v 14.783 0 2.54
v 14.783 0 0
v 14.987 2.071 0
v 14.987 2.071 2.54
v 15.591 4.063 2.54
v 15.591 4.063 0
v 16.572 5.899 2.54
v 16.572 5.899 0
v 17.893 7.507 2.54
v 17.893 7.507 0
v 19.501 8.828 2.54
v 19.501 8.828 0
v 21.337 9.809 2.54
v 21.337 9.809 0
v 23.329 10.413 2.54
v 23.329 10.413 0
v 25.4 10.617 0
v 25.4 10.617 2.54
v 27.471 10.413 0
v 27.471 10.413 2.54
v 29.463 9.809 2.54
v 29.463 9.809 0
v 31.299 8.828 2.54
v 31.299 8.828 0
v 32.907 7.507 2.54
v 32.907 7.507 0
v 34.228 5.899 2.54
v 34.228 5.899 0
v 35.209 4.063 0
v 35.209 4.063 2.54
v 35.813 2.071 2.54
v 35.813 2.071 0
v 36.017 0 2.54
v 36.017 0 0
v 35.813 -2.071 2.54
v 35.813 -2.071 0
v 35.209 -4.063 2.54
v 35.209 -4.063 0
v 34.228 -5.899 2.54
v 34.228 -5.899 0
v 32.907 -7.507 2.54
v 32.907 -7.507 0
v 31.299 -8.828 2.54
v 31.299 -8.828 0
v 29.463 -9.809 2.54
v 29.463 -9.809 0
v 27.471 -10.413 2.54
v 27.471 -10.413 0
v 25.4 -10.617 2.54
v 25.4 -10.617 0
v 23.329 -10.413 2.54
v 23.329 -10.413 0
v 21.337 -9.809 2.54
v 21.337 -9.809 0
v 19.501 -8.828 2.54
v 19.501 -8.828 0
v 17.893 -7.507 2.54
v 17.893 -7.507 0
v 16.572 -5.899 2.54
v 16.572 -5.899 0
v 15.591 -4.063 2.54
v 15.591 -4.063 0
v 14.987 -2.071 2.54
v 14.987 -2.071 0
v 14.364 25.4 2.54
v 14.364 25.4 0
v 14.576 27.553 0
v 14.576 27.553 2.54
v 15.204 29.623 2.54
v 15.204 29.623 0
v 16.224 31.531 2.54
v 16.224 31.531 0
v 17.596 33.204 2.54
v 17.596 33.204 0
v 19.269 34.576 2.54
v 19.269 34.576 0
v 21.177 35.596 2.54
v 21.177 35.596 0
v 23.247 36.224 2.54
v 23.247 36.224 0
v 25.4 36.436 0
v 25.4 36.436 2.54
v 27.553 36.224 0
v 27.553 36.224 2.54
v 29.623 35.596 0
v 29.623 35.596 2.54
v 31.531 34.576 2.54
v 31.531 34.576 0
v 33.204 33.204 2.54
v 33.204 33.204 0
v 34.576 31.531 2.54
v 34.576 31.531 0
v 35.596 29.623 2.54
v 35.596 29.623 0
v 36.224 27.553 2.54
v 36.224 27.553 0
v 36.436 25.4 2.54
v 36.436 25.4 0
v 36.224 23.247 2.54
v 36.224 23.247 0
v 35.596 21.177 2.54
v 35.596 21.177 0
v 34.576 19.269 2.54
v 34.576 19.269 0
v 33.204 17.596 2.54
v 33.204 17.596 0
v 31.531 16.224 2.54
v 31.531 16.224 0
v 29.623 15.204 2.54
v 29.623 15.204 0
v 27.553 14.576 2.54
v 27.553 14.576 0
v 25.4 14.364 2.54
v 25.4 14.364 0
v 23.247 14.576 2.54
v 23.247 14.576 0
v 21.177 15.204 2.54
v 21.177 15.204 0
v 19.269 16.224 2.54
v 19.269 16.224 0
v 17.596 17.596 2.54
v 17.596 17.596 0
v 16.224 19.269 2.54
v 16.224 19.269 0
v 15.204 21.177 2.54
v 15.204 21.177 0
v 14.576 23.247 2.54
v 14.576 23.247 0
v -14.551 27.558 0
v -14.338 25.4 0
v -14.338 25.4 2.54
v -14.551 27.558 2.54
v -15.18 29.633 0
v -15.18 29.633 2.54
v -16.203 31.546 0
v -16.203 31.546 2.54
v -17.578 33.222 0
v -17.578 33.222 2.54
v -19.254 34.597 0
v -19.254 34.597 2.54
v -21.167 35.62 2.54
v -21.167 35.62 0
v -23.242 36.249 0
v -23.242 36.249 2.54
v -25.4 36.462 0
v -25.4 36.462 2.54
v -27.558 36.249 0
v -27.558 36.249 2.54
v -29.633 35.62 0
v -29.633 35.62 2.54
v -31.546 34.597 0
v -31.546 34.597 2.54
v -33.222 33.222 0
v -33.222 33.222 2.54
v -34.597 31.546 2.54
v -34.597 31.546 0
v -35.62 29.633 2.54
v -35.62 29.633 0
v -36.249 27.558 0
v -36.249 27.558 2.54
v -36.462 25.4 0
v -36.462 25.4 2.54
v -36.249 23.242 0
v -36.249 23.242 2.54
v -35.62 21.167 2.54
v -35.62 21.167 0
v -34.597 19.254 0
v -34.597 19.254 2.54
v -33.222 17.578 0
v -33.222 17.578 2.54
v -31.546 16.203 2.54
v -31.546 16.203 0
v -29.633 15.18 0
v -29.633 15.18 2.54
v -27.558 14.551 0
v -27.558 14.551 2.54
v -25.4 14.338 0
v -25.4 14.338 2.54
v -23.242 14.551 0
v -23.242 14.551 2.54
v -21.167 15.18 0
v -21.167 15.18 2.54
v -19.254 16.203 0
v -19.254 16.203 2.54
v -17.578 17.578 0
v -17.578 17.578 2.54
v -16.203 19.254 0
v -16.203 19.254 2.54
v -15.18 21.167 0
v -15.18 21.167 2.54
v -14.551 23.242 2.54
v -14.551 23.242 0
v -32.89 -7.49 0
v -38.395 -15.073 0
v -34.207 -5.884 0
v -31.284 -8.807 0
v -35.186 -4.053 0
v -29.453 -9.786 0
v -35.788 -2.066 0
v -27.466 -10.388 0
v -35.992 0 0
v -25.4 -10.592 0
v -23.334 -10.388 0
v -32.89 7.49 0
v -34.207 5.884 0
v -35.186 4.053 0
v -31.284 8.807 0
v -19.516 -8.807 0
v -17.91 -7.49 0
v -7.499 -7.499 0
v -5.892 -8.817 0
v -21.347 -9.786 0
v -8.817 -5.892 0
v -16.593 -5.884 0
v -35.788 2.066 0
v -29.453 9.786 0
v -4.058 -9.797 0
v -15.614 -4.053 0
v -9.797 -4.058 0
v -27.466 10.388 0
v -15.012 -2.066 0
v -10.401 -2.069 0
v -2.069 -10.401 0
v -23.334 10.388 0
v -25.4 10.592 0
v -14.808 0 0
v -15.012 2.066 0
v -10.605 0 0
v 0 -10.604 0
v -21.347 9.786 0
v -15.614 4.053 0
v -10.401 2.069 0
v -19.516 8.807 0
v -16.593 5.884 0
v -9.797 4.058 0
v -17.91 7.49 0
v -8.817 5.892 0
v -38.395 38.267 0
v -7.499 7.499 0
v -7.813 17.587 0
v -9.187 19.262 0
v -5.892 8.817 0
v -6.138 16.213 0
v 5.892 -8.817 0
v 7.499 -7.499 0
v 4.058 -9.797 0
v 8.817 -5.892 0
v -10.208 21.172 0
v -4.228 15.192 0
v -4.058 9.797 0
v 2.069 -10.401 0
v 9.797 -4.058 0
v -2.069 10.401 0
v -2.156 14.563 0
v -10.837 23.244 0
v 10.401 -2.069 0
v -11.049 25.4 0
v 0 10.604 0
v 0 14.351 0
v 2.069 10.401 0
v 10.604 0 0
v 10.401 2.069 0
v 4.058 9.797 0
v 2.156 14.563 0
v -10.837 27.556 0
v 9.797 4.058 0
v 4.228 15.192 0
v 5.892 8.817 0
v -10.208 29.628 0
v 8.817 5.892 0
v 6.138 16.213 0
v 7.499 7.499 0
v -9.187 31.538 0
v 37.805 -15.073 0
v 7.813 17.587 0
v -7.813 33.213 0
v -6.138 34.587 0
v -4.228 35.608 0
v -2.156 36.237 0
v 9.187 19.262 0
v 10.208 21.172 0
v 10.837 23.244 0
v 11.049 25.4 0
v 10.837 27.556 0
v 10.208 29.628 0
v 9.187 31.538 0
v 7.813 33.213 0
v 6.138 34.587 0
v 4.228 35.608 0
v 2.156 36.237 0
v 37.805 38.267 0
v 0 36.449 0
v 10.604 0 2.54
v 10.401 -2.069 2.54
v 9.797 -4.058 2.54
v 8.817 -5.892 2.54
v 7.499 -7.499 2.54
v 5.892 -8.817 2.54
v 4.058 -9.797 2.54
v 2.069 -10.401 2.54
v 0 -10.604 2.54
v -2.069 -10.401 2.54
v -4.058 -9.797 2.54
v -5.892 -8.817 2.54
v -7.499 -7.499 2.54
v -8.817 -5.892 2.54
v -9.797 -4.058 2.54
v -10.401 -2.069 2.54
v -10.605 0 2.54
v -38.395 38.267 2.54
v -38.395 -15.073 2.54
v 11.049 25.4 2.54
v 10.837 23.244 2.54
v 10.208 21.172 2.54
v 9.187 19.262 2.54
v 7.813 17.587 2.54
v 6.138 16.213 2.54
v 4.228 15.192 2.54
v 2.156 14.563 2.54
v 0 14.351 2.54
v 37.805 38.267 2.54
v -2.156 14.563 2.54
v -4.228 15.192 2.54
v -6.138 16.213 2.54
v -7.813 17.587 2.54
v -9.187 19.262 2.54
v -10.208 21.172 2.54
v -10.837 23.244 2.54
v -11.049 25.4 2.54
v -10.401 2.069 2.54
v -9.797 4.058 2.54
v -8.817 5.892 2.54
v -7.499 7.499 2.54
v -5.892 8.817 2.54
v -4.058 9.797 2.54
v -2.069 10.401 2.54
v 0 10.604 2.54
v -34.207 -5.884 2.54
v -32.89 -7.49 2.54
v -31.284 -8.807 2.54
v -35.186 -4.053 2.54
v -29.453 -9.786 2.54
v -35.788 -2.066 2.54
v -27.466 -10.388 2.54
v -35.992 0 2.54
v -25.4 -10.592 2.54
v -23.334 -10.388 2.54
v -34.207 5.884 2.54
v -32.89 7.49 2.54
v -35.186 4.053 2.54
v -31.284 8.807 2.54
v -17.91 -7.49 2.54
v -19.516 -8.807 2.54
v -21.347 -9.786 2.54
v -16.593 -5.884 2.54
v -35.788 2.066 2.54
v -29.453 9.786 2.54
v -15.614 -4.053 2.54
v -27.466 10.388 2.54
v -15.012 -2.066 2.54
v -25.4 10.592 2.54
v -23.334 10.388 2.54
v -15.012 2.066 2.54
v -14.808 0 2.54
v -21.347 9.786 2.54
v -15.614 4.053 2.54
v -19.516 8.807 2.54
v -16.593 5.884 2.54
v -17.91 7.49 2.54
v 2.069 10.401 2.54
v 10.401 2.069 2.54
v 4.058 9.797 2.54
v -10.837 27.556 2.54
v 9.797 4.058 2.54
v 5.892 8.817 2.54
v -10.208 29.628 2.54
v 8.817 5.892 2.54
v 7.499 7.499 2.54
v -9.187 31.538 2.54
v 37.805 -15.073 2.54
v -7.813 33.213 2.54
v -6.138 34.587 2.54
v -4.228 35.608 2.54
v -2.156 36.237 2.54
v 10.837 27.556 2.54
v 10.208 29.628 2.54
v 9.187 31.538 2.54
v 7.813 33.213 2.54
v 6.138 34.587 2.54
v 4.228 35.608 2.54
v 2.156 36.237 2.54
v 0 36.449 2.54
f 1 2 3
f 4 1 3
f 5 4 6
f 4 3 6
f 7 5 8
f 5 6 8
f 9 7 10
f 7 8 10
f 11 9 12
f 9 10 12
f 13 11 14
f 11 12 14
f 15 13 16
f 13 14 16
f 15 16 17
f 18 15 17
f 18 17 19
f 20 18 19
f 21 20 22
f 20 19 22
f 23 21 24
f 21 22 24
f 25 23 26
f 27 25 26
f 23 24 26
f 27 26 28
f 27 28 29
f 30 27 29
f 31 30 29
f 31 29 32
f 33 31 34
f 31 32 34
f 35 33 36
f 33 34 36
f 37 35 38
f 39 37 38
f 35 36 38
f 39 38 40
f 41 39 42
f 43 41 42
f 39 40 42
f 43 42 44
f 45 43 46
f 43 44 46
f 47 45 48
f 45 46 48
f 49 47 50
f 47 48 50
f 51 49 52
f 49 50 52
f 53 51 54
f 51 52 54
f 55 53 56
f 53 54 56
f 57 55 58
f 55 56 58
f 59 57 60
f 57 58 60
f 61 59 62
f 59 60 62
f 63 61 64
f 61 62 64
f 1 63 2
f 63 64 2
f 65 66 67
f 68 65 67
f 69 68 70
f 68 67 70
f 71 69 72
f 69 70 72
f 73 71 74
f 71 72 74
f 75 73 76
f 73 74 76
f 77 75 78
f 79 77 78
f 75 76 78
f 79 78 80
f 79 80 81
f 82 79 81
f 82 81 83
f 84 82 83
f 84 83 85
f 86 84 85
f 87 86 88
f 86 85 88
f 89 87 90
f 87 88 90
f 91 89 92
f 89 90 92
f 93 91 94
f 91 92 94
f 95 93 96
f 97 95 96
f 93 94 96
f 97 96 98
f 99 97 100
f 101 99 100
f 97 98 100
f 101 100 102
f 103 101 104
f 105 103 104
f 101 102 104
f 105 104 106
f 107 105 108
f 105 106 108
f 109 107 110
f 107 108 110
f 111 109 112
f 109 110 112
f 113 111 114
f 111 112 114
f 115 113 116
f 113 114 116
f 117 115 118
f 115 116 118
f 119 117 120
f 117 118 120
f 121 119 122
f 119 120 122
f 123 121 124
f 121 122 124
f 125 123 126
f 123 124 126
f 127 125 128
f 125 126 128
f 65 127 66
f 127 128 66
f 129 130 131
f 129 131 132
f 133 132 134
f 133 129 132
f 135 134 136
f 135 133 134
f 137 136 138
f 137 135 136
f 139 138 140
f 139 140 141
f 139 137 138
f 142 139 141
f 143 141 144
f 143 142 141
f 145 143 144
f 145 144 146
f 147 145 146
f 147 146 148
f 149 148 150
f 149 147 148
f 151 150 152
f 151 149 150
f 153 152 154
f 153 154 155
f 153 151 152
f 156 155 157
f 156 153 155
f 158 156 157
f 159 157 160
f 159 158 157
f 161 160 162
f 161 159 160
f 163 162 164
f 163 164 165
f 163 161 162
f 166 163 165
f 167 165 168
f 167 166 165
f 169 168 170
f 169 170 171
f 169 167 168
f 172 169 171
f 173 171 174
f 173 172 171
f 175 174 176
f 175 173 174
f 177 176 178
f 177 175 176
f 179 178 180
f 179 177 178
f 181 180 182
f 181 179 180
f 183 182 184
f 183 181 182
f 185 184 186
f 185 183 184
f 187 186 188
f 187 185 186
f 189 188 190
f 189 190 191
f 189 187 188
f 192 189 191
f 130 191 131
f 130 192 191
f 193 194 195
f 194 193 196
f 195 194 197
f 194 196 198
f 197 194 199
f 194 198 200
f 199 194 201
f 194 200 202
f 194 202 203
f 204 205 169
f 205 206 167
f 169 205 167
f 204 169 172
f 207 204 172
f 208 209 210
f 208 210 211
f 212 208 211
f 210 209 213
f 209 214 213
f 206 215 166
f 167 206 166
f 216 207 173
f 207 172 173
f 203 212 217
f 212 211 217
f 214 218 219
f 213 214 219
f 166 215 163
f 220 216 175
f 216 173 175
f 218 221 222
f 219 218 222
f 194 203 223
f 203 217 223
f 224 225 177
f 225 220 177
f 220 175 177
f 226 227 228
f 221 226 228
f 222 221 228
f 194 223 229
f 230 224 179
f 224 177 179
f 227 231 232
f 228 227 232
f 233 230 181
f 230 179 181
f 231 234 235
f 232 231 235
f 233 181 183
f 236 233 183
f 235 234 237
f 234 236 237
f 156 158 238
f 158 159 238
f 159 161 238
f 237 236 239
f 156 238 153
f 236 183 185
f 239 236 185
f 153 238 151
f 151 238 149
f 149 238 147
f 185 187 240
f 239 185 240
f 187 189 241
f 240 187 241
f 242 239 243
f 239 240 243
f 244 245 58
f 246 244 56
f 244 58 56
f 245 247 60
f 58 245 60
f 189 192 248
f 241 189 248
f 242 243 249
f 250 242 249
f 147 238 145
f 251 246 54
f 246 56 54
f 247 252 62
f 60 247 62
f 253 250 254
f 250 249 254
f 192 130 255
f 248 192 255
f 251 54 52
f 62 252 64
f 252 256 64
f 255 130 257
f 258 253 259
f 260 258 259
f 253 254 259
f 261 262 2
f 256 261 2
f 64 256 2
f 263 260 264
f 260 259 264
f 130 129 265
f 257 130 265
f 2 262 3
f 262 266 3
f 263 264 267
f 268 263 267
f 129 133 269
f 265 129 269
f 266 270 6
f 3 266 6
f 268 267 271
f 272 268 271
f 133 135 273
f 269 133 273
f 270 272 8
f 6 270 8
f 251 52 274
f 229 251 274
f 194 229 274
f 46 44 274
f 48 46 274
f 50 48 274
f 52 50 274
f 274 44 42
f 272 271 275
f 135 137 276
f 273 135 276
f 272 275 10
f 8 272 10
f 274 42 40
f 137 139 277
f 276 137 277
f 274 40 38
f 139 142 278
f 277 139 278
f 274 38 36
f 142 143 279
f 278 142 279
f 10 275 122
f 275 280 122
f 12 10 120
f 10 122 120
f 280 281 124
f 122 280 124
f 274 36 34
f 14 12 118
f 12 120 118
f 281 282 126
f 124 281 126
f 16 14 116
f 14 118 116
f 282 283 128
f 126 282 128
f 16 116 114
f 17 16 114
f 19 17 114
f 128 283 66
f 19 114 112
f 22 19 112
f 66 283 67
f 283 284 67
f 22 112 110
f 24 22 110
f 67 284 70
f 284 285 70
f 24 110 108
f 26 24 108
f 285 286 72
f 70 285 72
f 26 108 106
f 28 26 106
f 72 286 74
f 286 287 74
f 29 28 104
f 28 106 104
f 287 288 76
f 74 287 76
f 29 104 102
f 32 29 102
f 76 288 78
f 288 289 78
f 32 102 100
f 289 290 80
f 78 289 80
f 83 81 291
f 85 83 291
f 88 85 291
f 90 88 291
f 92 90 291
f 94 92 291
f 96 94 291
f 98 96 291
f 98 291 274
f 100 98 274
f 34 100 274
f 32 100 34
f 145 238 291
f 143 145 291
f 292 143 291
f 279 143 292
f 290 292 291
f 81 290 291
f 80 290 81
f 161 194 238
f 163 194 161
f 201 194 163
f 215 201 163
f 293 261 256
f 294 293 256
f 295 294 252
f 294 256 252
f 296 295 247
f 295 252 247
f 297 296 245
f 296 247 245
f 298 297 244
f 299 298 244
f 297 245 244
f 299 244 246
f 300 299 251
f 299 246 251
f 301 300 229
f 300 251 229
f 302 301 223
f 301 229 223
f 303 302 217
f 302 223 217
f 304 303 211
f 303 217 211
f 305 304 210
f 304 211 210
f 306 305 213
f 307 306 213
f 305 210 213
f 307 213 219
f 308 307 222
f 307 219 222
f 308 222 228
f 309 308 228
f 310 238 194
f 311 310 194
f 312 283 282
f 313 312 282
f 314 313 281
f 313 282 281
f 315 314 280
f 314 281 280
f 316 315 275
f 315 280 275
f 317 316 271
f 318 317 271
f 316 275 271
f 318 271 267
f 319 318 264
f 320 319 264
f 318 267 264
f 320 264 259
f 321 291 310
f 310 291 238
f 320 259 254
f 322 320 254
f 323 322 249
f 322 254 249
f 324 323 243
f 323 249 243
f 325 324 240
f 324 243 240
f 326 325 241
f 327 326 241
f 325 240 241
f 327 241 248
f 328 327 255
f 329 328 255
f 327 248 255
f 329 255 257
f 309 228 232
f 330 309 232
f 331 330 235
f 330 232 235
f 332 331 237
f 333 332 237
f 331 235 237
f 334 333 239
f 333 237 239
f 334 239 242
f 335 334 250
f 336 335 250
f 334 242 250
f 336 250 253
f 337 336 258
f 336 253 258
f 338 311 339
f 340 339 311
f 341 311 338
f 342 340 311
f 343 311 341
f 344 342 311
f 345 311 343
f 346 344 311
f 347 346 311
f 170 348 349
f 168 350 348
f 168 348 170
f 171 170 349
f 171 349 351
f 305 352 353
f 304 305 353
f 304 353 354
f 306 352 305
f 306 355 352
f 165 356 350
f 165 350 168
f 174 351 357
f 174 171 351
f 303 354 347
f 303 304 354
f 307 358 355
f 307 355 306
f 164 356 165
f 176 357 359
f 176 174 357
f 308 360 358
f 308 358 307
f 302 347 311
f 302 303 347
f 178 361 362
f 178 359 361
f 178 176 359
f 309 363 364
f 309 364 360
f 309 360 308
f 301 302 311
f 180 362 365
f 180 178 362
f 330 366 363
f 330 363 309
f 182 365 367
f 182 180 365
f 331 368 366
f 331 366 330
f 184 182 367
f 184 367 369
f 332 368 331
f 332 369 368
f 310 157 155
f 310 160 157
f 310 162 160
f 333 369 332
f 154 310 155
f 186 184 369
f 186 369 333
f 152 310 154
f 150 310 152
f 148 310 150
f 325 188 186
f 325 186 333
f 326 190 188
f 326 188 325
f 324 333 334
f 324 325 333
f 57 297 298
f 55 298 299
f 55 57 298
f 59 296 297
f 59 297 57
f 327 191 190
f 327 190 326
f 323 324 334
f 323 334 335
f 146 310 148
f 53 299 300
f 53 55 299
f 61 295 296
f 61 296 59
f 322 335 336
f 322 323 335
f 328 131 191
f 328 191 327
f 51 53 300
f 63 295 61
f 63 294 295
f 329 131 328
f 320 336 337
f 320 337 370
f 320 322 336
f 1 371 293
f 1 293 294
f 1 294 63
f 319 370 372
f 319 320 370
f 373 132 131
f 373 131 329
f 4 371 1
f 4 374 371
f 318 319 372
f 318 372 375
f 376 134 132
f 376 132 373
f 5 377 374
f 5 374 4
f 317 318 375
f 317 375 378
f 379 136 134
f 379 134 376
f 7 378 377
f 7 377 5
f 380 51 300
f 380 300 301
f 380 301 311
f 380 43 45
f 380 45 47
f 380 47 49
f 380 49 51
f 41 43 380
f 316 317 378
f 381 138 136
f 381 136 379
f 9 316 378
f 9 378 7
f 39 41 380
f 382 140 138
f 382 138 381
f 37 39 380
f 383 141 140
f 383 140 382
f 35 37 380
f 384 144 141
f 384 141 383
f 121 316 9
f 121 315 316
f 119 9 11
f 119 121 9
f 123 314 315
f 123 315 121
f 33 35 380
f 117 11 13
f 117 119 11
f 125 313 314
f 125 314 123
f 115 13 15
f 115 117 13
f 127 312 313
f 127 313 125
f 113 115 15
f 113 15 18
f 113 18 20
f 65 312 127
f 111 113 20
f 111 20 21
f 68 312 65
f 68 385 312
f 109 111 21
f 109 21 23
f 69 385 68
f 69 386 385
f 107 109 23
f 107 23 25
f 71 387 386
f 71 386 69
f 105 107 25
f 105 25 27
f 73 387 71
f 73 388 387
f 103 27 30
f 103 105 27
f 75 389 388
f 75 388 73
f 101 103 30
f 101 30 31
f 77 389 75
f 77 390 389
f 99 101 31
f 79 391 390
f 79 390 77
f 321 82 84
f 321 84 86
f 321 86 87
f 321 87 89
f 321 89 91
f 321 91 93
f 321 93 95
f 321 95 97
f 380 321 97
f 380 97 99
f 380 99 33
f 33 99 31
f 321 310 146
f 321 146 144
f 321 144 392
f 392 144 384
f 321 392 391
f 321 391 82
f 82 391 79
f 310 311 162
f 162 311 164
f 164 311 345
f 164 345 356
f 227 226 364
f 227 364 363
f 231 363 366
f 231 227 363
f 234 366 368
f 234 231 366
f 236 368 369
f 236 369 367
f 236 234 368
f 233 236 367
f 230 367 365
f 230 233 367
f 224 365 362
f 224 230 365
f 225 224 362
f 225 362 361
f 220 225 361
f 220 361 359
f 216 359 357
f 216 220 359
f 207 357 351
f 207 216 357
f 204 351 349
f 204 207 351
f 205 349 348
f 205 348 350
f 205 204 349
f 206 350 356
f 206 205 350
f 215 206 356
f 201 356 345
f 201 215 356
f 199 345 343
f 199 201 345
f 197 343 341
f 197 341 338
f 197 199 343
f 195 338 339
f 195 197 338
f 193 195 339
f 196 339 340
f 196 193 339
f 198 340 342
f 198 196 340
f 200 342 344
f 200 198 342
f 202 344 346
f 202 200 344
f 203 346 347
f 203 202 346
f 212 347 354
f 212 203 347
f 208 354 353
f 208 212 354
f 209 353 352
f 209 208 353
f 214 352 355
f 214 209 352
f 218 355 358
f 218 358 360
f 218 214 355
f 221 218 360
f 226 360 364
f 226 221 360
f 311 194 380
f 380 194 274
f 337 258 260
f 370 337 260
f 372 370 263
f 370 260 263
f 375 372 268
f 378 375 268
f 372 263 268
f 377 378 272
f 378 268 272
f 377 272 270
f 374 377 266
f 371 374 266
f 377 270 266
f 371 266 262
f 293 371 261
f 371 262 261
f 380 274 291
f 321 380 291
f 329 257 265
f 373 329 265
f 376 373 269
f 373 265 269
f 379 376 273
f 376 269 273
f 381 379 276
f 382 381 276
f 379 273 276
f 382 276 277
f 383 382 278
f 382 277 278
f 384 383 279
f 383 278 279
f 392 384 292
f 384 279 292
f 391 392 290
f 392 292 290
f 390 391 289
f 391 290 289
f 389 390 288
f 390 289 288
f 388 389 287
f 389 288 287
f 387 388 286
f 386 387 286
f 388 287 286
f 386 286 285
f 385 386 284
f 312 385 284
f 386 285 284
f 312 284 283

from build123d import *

# Parameters (mm, degrees)
F0_R     = 10.5918
F0_R_2   = 11.0617
F1_DEPTH = 2.54


with BuildPart() as f1:
    # F0 (on Top) → F1 (new body)
    with BuildSketch(Plane.XY):
        Polygon((37.805012, 12.867026), (0, 12.867026), (-38.394988, 12.867026), (-38.394988, -15.072974), (37.805012, -15.072974), align=None)
        with Locations((-25.4, 0)):
            Circle(F0_R, mode=Mode.SUBTRACT)
        with BuildLine():
            ThreePointArc((0, 10.6045), (7.498514, 7.498514), (10.6045, 0))
            ThreePointArc((10.6045, 0), (0, -10.6045), (-10.6045, 0))
            ThreePointArc((-10.6045, 0), (-7.498514, 7.498514), (0, 10.6045))
        make_face(mode=Mode.SUBTRACT)
        with BuildLine():
            ThreePointArc((36.0172, 0), (25.4, -10.6172), (14.7828, 0))
            ThreePointArc((14.7828, 0), (25.4, 10.6172), (36.0172, 0))
        make_face(mode=Mode.SUBTRACT)
        Polygon((-38.394988, 12.867026), (0, 12.867026), (37.805012, 12.867026), (37.805012, 38.267026), (-38.394988, 38.267026), align=None)
        with Locations((-25.4, 25.4)):
            Circle(F0_R_2, mode=Mode.SUBTRACT)
        with BuildLine():
            ThreePointArc((11.049, 25.4), (7.812823, 17.587177), (0, 14.351))
            ThreePointArc((0, 14.351), (-7.812823, 17.587177), (-11.049, 25.4))
            ThreePointArc((-11.049, 25.4), (0, 36.449), (11.049, 25.4))
        make_face(mode=Mode.SUBTRACT)
        with BuildLine():
            ThreePointArc((36.4363, 25.4), (25.4, 14.3637), (14.3637, 25.4))
            ThreePointArc((14.3637, 25.4), (25.4, 36.4363), (36.4363, 25.4))
        make_face(mode=Mode.SUBTRACT)
    extrude(amount=F1_DEPTH)


solid = f1.part
